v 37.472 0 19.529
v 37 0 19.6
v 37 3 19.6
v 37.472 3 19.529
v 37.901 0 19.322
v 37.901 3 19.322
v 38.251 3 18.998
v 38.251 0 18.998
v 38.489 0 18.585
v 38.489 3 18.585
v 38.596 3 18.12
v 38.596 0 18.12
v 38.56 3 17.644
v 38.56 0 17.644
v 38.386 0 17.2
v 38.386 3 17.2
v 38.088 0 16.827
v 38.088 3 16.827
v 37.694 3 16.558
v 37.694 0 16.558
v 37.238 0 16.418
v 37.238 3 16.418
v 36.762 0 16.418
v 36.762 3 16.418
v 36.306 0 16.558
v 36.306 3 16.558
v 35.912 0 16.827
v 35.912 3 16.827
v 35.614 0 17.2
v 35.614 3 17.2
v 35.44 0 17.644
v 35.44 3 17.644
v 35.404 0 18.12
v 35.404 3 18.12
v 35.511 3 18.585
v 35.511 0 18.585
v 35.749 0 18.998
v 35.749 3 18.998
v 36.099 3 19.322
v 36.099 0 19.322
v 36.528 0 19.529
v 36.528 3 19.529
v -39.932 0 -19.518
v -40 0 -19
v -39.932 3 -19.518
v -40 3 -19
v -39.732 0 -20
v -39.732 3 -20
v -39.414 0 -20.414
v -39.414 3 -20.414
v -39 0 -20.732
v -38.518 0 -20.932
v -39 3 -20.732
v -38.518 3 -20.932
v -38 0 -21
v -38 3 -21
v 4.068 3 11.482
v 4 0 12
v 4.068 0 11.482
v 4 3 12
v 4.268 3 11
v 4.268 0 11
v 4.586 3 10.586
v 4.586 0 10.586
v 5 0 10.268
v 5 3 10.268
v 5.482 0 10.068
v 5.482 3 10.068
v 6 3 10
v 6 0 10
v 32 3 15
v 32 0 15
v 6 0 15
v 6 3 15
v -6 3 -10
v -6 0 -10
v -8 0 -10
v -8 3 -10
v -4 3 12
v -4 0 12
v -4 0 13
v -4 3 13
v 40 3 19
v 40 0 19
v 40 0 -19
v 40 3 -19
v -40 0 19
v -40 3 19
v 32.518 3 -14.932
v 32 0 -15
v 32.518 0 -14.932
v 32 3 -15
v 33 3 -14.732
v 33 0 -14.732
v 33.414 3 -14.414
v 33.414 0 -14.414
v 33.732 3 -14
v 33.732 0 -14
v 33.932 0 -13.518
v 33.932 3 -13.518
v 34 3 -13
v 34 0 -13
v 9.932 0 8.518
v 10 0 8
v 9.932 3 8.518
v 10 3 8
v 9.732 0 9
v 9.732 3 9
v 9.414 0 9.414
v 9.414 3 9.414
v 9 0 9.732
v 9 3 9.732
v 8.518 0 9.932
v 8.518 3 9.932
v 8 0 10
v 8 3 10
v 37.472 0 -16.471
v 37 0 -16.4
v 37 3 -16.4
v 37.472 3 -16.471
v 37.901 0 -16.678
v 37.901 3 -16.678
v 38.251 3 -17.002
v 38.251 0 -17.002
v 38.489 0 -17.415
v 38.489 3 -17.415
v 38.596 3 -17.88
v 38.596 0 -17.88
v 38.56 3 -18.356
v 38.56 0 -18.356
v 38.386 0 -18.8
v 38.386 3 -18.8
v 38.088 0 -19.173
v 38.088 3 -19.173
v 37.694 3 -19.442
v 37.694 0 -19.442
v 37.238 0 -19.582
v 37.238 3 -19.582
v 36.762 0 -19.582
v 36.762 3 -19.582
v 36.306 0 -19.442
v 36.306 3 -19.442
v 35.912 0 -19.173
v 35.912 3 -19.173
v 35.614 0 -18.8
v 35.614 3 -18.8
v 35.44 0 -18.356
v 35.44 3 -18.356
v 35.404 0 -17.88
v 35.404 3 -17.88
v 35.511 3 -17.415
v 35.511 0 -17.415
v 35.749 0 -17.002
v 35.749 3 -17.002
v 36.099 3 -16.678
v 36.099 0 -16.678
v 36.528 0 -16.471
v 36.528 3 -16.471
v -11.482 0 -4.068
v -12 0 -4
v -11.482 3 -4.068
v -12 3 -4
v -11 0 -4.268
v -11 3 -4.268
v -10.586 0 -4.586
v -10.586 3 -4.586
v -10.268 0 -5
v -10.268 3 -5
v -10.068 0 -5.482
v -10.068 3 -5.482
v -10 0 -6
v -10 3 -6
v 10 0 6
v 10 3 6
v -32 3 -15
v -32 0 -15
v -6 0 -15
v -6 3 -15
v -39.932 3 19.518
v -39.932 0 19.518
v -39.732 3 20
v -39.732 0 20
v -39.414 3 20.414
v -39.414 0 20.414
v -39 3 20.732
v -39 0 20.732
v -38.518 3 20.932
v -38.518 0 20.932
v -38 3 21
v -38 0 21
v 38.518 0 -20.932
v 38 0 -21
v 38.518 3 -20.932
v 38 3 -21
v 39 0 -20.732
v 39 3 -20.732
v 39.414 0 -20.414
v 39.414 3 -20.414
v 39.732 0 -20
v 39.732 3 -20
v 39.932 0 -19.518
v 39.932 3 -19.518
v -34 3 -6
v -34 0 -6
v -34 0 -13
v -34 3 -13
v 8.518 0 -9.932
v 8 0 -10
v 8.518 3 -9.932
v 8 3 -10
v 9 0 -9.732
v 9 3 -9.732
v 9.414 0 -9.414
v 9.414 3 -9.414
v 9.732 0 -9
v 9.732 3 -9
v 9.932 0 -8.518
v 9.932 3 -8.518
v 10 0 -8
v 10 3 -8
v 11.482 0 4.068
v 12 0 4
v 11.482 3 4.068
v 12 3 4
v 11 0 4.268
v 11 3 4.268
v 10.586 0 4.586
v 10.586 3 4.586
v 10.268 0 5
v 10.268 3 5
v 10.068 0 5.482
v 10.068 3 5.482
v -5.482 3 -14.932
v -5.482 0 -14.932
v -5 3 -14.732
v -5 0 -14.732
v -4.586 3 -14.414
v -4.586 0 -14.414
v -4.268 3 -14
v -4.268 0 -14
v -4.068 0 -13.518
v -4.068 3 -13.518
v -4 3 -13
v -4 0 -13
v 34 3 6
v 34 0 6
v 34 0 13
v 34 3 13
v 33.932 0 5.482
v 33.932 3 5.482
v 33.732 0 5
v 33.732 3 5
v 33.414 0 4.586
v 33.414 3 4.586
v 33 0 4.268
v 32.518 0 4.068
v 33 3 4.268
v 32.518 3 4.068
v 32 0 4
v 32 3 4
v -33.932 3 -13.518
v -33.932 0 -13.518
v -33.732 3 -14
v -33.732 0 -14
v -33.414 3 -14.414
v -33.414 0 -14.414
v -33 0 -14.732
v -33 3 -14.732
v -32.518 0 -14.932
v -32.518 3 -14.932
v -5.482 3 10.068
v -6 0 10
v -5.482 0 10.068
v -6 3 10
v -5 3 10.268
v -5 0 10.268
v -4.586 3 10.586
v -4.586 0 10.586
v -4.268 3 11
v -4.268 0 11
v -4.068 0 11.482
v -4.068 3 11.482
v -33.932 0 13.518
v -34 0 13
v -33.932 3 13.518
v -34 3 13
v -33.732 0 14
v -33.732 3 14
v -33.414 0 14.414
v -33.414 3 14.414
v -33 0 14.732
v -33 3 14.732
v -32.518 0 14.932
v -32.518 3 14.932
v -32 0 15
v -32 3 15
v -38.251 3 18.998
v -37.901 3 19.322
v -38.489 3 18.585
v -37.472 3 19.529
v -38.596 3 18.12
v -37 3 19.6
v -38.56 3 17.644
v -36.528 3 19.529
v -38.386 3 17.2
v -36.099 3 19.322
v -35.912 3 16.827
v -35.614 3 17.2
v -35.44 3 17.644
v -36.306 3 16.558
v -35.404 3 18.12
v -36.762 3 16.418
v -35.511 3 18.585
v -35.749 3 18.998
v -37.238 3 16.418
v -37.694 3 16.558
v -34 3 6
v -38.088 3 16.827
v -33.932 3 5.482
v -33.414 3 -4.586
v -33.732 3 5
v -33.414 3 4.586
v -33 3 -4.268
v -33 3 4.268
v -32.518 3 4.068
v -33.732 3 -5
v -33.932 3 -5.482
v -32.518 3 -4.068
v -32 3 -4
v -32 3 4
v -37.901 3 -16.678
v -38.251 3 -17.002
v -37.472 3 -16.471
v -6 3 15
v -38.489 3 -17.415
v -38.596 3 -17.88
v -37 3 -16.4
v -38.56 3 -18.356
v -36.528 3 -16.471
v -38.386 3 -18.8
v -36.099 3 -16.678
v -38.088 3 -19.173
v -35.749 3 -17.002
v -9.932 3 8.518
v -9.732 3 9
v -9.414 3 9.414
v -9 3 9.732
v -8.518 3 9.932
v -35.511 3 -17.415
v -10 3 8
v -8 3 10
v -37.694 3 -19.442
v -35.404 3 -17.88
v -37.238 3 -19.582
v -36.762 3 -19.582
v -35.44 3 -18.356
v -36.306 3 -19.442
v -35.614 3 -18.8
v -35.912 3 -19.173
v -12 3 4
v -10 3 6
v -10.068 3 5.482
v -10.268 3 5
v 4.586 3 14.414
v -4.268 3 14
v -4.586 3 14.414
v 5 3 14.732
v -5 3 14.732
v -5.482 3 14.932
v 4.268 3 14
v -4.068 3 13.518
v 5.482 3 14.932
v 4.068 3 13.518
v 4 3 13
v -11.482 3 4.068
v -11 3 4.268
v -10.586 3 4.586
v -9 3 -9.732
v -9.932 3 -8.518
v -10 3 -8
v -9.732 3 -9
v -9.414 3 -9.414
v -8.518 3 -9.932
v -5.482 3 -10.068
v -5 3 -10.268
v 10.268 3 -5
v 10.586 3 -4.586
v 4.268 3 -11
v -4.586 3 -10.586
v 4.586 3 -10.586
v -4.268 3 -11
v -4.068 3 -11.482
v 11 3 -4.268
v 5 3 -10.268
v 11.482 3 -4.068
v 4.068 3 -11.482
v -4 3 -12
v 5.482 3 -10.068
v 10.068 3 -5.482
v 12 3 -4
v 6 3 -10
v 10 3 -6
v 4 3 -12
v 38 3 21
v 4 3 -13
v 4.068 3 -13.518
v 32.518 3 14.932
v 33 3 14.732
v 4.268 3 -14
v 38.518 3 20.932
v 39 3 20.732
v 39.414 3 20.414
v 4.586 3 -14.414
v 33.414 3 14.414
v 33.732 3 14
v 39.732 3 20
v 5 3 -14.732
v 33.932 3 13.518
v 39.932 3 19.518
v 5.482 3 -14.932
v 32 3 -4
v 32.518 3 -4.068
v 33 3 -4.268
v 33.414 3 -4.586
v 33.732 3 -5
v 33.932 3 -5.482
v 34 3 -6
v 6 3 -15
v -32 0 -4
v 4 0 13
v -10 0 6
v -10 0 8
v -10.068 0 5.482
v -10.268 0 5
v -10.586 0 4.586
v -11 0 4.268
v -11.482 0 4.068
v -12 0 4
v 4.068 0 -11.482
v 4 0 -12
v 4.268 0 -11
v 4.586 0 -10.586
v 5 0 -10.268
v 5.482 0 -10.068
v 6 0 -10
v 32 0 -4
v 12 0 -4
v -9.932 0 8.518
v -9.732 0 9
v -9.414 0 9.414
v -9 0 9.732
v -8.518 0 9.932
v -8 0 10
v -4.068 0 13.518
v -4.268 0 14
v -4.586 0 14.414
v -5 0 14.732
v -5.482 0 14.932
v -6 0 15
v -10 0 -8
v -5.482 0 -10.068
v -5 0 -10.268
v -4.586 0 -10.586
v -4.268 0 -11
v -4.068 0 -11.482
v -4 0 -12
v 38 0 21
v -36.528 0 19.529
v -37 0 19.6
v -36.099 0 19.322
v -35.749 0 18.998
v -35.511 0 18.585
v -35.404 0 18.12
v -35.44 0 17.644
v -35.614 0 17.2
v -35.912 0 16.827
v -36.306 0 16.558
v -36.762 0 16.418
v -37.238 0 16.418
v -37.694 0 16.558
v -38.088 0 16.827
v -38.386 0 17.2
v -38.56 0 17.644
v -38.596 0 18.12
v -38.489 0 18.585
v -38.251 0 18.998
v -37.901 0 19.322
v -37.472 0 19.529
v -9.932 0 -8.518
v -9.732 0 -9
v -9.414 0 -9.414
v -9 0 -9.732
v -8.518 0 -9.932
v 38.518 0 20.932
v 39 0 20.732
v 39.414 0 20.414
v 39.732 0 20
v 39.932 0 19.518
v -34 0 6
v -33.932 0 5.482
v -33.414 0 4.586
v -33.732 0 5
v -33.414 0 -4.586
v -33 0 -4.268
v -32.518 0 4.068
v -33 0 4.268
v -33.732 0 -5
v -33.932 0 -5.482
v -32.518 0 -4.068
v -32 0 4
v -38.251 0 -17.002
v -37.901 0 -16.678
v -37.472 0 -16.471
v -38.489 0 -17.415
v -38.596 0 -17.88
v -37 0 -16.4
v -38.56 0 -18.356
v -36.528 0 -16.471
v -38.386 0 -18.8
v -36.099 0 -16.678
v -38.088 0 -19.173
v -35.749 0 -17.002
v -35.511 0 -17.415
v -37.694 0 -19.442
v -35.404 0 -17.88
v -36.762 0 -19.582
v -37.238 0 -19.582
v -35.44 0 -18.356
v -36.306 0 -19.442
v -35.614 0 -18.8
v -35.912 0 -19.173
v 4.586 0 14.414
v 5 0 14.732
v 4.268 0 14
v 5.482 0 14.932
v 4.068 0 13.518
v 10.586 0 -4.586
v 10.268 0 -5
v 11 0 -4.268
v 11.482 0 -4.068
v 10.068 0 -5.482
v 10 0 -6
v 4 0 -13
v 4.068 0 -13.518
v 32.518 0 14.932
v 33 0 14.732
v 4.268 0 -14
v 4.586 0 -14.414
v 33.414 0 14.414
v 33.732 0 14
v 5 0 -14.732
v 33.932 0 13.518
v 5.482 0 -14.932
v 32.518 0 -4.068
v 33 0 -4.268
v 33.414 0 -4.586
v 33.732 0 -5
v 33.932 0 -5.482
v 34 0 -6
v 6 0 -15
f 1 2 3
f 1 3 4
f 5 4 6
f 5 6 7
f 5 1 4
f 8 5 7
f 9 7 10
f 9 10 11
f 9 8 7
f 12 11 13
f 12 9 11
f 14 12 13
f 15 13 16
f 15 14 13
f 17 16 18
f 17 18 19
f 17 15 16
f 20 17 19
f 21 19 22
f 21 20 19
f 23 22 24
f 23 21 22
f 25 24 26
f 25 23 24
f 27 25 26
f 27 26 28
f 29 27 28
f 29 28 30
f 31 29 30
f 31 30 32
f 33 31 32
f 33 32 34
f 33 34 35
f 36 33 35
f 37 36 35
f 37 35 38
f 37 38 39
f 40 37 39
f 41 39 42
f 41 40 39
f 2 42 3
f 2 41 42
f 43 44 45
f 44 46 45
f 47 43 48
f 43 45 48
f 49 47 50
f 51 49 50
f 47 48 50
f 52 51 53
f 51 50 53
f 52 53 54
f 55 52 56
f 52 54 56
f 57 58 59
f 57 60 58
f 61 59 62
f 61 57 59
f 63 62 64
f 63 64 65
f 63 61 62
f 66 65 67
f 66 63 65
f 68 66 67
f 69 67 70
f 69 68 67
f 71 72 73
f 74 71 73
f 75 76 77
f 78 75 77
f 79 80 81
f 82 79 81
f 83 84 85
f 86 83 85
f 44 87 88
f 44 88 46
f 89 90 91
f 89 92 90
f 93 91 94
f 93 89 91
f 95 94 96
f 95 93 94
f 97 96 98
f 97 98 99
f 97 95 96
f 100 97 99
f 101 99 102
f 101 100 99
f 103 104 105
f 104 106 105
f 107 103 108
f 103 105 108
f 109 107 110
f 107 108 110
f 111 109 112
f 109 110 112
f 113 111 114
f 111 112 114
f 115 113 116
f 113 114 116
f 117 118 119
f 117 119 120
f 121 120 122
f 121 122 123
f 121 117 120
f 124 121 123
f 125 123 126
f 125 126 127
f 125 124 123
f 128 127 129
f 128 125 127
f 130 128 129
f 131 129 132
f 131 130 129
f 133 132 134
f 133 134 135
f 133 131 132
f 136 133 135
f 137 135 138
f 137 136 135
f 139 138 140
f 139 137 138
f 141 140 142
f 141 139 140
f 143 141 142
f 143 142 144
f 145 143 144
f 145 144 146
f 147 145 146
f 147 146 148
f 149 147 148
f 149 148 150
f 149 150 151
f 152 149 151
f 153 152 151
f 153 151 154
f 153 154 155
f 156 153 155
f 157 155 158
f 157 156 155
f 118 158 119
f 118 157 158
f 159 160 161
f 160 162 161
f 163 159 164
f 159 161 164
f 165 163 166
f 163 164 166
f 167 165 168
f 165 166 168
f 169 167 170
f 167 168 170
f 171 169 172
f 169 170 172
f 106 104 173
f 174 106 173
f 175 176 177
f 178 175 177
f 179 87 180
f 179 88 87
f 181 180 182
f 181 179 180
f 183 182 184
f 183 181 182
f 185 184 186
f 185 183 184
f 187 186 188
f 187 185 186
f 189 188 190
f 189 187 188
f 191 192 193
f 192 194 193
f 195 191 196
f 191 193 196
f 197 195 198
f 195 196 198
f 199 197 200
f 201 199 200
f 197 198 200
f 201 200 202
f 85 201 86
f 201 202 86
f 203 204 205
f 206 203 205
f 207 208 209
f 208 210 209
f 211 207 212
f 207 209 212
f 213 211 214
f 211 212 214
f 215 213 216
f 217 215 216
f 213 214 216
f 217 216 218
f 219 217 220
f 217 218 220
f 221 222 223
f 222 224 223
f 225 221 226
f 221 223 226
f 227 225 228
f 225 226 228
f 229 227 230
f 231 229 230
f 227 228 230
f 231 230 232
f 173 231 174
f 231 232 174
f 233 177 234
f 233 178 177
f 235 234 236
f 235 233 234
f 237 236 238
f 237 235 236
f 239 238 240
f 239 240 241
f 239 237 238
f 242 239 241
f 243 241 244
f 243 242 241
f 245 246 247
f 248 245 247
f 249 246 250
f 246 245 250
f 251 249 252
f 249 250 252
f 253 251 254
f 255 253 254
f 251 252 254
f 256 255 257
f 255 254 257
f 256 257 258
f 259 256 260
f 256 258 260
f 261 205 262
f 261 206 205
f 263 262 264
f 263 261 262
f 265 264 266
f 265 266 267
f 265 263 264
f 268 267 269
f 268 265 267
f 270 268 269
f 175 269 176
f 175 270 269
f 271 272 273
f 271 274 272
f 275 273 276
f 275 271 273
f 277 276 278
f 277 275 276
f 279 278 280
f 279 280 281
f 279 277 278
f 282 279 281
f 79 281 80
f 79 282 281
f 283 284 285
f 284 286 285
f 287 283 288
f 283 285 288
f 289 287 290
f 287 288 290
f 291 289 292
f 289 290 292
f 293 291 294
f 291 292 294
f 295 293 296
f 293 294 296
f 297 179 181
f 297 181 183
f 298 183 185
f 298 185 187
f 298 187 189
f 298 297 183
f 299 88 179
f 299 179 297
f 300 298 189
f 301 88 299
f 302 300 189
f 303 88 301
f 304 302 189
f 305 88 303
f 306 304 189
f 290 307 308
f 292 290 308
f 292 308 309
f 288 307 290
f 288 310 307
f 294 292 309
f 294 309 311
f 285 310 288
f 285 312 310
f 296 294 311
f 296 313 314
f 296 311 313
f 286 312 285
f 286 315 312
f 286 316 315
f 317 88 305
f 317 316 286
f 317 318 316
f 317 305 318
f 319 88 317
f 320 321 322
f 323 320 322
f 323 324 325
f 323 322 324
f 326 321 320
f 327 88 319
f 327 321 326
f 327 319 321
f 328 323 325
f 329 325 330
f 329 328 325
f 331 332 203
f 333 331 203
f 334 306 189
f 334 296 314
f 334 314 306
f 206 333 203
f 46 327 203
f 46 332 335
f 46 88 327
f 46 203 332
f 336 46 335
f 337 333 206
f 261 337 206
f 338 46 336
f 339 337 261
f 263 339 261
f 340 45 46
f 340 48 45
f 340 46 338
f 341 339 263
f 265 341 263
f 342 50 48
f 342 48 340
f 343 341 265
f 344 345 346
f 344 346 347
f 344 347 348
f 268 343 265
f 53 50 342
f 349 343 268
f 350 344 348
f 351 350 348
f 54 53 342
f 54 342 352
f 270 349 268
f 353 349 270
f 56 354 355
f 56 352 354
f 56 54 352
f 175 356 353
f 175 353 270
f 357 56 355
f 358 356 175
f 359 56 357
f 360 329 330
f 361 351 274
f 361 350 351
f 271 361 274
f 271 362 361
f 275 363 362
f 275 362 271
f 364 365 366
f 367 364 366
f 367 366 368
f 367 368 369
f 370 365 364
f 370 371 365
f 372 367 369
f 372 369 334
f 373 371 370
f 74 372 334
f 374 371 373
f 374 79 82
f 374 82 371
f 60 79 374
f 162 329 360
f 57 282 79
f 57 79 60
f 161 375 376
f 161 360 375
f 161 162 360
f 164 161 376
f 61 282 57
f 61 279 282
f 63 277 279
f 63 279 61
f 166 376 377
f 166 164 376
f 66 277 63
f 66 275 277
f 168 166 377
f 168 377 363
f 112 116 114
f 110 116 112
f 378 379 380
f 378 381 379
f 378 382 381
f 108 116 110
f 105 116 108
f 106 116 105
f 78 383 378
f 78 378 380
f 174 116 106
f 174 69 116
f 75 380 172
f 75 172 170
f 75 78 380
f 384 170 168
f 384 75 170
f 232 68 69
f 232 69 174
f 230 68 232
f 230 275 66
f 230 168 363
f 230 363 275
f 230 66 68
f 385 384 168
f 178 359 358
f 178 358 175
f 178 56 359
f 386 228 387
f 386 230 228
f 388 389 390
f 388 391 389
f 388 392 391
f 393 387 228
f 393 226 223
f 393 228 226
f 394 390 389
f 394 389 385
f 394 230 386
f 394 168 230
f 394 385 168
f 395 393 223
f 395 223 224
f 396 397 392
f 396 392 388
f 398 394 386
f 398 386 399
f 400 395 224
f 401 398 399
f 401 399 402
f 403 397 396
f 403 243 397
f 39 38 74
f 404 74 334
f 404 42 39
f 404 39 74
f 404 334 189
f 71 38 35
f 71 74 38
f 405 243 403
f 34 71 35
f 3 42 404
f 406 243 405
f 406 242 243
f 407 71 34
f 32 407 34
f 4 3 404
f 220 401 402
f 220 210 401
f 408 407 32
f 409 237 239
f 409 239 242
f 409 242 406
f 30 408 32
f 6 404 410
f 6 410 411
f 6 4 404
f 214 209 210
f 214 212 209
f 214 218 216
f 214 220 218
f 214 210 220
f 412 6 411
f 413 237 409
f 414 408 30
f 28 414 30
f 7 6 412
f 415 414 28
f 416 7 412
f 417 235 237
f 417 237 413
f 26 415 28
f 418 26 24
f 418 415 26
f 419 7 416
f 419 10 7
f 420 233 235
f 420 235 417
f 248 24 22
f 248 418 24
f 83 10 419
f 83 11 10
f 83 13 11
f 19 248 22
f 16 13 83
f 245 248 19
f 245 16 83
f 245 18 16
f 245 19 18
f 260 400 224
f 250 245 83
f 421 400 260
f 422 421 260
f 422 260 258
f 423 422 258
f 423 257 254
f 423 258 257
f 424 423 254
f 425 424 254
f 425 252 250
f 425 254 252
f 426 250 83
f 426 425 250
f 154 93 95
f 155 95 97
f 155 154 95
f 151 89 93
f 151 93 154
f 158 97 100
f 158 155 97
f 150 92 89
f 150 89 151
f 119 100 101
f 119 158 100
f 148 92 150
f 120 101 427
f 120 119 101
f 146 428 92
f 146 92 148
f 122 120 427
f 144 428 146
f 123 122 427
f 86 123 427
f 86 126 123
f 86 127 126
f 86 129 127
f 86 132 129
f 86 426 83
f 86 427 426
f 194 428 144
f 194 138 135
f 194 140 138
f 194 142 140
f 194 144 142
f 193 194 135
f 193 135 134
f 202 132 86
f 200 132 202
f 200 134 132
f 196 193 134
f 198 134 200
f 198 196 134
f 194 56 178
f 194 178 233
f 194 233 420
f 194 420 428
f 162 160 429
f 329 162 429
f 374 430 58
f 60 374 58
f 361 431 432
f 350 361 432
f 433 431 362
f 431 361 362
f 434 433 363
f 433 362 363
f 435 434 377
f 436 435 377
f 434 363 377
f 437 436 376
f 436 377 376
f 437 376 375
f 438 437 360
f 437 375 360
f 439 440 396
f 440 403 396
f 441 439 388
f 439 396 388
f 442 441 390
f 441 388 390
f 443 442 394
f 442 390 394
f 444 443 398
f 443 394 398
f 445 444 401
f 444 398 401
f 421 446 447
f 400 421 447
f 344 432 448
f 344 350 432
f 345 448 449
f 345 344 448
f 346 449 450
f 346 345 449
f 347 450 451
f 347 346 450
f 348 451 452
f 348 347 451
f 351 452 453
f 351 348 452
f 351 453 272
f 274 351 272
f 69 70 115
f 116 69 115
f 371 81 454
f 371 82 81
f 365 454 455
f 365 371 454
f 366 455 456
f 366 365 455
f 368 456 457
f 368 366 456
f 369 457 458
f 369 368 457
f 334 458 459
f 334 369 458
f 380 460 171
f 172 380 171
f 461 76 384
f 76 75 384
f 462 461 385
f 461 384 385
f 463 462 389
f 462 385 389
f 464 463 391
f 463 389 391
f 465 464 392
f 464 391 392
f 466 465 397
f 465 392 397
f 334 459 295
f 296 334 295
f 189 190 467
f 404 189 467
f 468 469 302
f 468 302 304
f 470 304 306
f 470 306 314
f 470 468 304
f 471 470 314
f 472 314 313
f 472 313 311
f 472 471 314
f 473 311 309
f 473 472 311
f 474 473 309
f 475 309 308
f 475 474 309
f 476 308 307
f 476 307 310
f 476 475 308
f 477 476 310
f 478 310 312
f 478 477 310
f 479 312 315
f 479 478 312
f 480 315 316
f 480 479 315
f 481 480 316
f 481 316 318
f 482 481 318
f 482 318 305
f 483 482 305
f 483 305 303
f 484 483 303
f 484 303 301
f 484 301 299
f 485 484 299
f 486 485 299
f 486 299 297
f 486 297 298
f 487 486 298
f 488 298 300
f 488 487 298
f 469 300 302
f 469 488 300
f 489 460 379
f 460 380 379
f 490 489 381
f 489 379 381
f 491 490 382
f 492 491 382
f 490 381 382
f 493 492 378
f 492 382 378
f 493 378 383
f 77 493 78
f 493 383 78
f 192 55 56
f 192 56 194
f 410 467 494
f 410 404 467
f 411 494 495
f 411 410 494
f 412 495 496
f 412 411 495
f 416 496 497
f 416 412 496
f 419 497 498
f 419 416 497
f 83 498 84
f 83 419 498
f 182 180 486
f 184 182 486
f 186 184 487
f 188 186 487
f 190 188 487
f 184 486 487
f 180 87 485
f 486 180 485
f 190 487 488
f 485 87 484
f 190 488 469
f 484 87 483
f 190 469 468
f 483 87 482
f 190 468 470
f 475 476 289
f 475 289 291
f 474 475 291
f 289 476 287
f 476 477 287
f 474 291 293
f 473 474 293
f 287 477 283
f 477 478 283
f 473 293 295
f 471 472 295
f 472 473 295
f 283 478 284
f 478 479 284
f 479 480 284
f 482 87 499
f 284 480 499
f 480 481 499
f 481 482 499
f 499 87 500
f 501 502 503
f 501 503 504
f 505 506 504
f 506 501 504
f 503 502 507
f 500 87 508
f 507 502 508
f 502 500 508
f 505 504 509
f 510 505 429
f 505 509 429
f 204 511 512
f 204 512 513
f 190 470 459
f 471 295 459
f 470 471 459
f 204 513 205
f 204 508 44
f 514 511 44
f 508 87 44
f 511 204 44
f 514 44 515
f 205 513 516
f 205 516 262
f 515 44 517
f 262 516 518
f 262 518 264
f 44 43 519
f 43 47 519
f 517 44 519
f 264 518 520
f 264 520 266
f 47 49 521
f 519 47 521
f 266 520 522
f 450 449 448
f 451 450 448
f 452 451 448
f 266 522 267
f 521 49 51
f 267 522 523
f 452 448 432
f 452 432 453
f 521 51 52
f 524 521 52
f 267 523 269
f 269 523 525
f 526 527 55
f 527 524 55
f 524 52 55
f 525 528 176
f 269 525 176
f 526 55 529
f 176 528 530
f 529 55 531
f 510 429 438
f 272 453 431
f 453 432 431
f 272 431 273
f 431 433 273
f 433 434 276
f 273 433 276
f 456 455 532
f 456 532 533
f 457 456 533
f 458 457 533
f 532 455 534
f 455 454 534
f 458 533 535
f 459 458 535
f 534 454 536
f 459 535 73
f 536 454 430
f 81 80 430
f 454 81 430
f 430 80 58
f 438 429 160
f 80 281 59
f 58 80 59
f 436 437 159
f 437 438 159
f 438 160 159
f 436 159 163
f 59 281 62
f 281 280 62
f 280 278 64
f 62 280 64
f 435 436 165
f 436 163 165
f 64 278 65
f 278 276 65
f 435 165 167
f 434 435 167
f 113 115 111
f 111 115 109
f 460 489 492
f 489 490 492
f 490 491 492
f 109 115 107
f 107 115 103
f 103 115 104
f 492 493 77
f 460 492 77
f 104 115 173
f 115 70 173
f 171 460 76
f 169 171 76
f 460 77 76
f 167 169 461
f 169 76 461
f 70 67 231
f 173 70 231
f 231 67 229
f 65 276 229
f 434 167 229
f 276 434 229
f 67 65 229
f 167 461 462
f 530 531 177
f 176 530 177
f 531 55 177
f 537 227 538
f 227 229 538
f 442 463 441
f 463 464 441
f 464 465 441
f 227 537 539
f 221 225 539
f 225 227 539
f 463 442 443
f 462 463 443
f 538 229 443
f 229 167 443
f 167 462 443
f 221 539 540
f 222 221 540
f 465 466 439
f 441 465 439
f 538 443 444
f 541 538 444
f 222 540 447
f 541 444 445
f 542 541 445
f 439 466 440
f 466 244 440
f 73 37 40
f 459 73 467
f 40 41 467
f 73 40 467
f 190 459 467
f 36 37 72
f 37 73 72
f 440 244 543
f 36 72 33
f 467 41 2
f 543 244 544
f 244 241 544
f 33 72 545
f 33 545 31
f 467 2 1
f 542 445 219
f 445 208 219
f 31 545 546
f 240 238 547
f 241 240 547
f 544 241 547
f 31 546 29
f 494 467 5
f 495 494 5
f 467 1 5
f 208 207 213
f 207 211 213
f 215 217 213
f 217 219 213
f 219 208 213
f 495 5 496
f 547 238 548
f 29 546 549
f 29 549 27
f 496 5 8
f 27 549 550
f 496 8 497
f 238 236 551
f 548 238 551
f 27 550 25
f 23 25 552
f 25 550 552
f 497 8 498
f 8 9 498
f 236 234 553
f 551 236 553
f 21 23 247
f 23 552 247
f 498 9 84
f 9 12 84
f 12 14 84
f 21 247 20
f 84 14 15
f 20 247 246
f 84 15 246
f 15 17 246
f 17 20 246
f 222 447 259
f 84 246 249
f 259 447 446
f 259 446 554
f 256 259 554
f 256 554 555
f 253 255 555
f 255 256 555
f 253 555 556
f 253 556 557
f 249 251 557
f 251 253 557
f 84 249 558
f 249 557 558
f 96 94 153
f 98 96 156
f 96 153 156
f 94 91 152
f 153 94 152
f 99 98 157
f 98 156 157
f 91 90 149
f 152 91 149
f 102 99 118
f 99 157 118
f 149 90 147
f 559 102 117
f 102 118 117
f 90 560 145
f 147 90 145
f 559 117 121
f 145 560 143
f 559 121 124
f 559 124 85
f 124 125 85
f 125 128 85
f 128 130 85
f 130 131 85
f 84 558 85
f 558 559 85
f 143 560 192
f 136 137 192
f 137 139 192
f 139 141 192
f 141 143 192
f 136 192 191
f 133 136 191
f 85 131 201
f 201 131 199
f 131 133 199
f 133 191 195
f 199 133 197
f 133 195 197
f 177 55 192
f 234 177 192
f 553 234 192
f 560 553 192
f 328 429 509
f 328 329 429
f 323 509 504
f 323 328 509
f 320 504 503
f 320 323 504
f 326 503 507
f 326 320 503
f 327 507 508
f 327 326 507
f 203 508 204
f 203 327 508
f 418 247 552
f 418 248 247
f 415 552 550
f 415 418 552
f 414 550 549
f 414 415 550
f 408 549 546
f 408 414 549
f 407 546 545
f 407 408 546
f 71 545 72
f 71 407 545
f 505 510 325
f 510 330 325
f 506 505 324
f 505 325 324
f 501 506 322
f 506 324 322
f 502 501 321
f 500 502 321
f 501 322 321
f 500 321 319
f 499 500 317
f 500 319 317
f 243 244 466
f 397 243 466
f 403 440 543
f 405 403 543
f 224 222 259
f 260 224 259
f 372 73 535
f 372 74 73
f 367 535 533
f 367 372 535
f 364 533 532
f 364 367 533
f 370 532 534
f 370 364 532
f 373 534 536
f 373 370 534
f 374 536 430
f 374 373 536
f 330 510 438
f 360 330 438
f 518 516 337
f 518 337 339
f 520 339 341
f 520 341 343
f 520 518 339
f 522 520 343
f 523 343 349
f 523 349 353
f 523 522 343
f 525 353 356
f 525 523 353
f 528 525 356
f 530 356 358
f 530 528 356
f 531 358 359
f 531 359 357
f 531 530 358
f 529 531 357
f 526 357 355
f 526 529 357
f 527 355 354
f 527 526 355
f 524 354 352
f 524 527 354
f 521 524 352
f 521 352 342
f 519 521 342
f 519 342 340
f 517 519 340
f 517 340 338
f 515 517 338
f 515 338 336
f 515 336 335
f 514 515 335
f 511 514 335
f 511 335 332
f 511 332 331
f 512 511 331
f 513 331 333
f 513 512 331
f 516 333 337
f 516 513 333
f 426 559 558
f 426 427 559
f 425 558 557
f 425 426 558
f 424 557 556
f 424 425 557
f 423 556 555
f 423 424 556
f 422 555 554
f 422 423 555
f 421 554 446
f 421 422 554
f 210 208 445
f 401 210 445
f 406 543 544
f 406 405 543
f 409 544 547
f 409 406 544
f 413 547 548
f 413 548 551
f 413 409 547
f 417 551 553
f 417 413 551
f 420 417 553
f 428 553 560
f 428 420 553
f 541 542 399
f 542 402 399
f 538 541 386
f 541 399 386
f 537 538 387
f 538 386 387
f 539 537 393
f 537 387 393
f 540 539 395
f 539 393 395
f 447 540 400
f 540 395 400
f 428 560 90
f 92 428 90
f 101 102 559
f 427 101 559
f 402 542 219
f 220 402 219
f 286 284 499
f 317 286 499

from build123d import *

# Parameters (mm, degrees)
SKETCH_1_W      = 80
SKETCH_1_H      = 42
SKETCH_1_R      = 1.6
EXTRUDE_1_DEPTH = 3
FILLET_1_R      = 2
FILLET_2_R      = 2


with BuildPart() as part:
    # 草图1 → 凸台-拉伸1 (new body)
    with BuildSketch(Plane(origin=(0, 0, 0), x_dir=(1, 0, 0), z_dir=(0, 1, 0))):
        Rectangle(SKETCH_1_W, SKETCH_1_H)
        with Locations(Location((-37, -18, 0), (0, 0, 270))):
            Circle(SKETCH_1_R, mode=Mode.SUBTRACT)
        Polygon((34, -15), (4, -15), (4, -10), (10, -10), (10, -4), (34, -4), align=None, mode=Mode.SUBTRACT)
        Polygon((-10, -10), (-4, -10), (-4, -15), (-34, -15), (-34, -4), (-10, -4), align=None, mode=Mode.SUBTRACT)
        Polygon((-34, 4), (-34, 15), (-4, 15), (-4, 10), (-10, 10), (-10, 4), align=None, mode=Mode.SUBTRACT)
        Polygon((4, 15), (34, 15), (34, 4), (10, 4), (10, 10), (4, 10), align=None, mode=Mode.SUBTRACT)
        with Locations(Location((37, -18, 0), (0, 0, 270))):
            Circle(SKETCH_1_R, mode=Mode.SUBTRACT)
        with Locations(Location((-37, 18, 0), (0, 0, 270))):
            Circle(SKETCH_1_R, mode=Mode.SUBTRACT)
        with Locations(Location((37, 18, 0), (0, 0, 270))):
            Circle(SKETCH_1_R, mode=Mode.SUBTRACT)
    extrude(amount=EXTRUDE_1_DEPTH)

    # 圆角1
    fillet_1_edges = [part.edges().sort_by_distance(p)[0] for p in [
        (34, 1.5, 15),
        (34, 1.5, 4),
        (10, 1.5, 4),
        (10, 1.5, 10),
        (4, 1.5, 10),
        (4, 1.5, 15),
        (-4, 1.5, 10),
        (-10, 1.5, 10),
        (-10, 1.5, 4),
        (-34, 1.5, 4),
        (-34, 1.5, 15),
        (-4, 1.5, 15),
        (-4, 1.5, -15),
        (-34, 1.5, -15),
        (-34, 1.5, -4),
        (-10, 1.5, -4),
        (-10, 1.5, -10),
        (-4, 1.5, -10),
        (34, 1.5, -4),
        (34, 1.5, -15),
        (4, 1.5, -15),
        (4, 1.5, -10),
        (10, 1.5, -10),
        (10, 1.5, -4),
    ]]
    fillet(fillet_1_edges, radius=FILLET_1_R)

    # 圆角2
    fillet_2_edges = [part.edges().sort_by_distance(p)[0] for p in [
        (-40, 1.5, -21),
        (40, 1.5, -21),
        (40, 1.5, 21),
        (-40, 1.5, 21),
    ]]
    fillet(fillet_2_edges, radius=FILLET_2_R)


solid = part.part
